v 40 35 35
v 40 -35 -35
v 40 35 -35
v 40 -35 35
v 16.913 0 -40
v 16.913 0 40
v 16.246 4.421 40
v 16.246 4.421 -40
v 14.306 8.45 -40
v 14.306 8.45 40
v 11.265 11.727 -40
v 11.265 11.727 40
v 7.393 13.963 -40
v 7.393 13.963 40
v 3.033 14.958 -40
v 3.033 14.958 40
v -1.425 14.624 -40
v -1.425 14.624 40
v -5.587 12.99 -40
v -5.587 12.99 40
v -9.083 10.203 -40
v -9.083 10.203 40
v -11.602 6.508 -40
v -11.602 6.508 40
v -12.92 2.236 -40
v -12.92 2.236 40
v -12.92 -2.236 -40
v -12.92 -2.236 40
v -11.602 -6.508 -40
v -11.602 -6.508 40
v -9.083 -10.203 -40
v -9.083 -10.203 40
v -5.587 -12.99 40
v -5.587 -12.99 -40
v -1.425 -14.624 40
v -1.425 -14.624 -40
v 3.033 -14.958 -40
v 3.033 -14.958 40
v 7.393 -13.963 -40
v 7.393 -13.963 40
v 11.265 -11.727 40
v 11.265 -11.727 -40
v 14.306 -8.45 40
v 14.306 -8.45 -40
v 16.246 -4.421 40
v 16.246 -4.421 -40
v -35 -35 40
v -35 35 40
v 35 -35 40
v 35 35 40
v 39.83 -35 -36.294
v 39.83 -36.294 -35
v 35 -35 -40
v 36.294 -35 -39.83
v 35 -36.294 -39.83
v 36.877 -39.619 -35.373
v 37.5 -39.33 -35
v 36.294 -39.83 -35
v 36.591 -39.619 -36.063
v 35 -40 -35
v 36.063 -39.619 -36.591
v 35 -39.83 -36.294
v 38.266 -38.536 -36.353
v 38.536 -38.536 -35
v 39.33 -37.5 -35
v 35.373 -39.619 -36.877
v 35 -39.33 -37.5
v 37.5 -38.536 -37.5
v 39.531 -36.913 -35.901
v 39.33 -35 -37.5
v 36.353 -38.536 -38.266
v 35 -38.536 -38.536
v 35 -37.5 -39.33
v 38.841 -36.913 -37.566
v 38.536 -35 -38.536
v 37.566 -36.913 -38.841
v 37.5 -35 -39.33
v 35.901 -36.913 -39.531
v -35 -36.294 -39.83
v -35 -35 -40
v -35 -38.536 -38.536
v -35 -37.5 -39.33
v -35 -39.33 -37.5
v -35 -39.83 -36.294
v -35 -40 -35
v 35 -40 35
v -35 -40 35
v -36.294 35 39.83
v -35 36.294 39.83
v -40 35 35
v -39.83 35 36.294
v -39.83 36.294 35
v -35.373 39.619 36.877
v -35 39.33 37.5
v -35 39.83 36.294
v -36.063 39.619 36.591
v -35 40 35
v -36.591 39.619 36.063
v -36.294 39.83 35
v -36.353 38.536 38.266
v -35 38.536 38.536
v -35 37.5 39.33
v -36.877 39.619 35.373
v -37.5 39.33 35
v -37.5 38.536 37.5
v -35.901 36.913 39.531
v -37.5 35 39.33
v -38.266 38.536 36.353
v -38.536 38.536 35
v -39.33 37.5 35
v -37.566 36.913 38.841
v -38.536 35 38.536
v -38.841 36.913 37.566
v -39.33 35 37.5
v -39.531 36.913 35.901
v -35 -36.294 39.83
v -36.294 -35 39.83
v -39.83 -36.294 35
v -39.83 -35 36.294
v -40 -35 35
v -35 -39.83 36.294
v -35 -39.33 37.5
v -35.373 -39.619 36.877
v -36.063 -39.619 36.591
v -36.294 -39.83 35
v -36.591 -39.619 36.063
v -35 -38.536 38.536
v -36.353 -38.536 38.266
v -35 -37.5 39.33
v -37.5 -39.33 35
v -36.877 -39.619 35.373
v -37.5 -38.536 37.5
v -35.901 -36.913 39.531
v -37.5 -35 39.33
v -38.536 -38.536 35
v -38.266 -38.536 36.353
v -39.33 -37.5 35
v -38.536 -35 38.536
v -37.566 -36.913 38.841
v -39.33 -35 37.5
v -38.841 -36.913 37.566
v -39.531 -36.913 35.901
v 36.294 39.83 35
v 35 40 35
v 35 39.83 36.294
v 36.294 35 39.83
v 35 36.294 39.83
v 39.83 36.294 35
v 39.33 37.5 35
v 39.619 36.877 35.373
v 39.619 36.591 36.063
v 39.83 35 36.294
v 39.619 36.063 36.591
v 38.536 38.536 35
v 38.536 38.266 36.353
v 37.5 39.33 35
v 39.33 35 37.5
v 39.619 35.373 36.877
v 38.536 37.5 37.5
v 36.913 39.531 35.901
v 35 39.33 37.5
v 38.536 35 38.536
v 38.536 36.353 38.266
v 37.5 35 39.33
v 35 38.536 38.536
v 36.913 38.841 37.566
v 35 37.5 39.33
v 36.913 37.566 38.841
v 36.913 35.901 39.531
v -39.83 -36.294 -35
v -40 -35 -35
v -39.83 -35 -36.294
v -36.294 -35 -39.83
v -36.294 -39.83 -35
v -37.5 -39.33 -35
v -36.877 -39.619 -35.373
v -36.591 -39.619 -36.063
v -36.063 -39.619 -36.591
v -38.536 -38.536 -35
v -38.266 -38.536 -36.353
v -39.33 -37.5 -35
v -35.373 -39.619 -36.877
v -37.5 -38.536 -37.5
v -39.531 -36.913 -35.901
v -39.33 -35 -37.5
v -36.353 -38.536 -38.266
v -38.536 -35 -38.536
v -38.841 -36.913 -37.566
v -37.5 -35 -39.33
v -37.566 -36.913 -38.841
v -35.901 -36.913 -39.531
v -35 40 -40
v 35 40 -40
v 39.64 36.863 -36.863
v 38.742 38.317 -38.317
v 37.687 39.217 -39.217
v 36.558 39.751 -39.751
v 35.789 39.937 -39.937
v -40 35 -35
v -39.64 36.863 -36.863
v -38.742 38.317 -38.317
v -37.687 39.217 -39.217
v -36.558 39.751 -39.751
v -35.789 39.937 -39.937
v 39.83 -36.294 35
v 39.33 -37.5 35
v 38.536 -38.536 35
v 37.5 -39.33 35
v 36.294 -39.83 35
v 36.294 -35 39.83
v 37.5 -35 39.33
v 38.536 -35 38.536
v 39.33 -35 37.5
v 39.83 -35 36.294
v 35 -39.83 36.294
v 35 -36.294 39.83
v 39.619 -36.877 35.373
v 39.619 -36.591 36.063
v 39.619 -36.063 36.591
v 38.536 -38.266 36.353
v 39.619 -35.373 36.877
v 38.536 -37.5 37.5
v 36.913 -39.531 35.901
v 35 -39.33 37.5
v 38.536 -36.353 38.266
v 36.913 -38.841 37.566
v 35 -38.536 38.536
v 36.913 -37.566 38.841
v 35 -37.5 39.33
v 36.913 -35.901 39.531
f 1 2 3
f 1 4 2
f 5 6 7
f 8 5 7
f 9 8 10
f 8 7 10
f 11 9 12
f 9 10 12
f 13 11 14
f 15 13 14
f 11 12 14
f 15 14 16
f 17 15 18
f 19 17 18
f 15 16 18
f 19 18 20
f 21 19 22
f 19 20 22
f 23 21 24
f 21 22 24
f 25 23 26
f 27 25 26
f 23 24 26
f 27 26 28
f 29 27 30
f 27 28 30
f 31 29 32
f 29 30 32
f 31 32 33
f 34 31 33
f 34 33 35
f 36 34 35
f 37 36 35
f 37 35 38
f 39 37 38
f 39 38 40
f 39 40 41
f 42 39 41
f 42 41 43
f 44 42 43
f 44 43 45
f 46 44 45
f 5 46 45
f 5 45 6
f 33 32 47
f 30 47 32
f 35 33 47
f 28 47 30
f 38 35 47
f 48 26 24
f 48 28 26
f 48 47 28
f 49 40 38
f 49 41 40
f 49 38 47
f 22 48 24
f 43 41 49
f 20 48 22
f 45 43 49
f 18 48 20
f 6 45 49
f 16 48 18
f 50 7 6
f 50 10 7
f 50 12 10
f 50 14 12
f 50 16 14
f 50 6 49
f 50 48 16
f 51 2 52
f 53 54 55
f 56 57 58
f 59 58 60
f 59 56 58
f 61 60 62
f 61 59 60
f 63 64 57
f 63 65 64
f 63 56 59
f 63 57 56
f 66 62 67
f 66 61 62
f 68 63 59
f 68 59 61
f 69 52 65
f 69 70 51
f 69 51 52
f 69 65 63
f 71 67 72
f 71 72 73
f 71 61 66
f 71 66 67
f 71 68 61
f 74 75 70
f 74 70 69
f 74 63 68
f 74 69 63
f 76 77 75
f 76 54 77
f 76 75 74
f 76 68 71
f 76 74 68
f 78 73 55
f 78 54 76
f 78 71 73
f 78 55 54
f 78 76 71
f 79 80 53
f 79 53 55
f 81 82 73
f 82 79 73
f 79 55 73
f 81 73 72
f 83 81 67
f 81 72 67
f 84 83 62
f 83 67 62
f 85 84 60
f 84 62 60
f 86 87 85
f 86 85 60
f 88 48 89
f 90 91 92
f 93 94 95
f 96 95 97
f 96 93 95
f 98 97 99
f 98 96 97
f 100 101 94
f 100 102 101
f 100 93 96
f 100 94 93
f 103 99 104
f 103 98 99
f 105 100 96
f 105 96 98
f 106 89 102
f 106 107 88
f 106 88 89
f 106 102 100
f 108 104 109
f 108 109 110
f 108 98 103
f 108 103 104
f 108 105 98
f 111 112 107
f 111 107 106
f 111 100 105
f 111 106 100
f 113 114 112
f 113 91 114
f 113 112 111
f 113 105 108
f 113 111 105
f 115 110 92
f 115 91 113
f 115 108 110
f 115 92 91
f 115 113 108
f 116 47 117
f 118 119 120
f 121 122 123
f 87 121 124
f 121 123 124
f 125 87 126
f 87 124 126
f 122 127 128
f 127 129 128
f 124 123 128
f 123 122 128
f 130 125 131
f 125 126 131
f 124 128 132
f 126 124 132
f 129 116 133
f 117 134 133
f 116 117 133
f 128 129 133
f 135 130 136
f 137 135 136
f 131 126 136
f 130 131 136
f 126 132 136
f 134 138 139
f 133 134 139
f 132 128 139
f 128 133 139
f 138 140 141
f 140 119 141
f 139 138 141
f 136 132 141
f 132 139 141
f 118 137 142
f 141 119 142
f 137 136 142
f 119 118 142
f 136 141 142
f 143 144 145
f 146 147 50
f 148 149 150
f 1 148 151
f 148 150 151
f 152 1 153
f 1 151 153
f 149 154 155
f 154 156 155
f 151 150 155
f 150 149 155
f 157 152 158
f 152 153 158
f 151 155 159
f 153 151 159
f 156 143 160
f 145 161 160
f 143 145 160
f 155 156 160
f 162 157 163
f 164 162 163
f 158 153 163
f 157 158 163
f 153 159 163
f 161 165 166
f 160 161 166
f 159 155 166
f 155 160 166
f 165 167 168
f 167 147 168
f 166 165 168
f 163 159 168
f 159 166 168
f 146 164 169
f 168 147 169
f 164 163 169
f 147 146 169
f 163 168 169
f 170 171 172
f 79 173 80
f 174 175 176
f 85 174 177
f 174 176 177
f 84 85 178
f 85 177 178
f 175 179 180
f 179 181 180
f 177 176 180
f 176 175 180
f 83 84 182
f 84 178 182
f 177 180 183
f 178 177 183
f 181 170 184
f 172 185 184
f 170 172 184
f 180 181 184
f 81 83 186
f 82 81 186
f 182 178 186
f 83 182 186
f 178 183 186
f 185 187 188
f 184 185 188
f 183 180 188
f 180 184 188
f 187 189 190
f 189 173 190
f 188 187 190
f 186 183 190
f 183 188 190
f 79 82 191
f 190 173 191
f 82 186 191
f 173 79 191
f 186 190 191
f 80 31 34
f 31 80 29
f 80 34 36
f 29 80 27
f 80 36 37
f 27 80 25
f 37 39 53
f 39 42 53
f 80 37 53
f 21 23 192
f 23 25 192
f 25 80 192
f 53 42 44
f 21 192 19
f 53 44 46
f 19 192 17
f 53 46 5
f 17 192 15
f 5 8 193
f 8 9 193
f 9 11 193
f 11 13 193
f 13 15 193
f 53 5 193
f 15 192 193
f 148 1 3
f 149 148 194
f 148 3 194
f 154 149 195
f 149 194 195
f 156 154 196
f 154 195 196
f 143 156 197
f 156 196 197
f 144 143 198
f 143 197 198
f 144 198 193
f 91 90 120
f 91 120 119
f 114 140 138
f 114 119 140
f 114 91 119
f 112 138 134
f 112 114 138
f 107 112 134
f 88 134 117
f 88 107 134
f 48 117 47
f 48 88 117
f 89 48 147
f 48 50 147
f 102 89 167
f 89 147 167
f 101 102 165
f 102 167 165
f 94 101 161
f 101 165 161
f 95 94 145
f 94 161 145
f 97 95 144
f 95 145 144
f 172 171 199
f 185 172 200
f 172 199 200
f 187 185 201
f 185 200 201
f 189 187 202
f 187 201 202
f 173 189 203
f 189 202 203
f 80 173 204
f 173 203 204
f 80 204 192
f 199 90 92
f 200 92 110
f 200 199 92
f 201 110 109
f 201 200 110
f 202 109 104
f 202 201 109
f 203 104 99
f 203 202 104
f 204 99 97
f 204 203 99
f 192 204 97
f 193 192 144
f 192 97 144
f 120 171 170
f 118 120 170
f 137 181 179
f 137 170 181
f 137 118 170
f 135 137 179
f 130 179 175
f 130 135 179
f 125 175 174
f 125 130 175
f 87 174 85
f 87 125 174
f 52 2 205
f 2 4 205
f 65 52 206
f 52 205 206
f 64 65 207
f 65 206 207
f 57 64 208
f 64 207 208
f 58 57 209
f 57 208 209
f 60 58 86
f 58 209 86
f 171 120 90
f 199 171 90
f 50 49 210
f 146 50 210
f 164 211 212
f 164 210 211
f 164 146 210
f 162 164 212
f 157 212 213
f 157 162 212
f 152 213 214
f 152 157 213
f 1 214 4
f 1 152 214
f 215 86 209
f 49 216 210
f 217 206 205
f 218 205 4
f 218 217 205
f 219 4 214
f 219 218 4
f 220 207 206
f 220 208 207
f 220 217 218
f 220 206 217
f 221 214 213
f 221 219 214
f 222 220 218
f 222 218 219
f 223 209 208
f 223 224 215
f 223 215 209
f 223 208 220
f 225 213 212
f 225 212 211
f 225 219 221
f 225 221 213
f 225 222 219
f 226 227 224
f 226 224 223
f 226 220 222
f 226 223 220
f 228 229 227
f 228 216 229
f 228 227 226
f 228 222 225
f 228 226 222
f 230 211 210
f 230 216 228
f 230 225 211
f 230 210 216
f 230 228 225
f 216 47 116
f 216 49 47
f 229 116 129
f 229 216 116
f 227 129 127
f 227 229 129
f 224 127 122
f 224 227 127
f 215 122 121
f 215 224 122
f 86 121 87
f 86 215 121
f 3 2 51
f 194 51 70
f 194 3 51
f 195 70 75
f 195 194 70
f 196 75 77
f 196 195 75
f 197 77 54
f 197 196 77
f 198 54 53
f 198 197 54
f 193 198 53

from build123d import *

# Parameters (mm, degrees)
F0_W     = 80
F0_H     = 80
F1_DEPTH = 40
F2_R     = 5
F3_R     = 15
F4_DEPTH = 80.001


with BuildPart() as f1:
    # F0 (on Top) → F1 (new body, symmetric)
    with BuildSketch(Plane.XY):
        Rectangle(F0_W, F0_H)
    extrude(amount=F1_DEPTH, both=True)

    # F2
    f2_edges = [f1.edges().sort_by_distance(p)[0] for p in [
        (-40, 0, 40),
        (-40, 0, -40),
        (0, 40, 40),
        (0, -40, 40),
        (-40, -40, 0),
        (-40, 40, 0),
        (40, 0, -40),
        (40, 40, 0),
        (40, -40, 0),
        (0, -40, -40),
        (40, 0, 40),
    ]]
    fillet(f2_edges, radius=F2_R)

    # F3 (on face) → F4 (cut, through all)
    with BuildSketch(Plane.XY.offset(40)):
        with Locations((1.912538, 0)):
            Circle(F3_R)
    extrude(amount=-F4_DEPTH, mode=Mode.SUBTRACT)


solid = f1.part
